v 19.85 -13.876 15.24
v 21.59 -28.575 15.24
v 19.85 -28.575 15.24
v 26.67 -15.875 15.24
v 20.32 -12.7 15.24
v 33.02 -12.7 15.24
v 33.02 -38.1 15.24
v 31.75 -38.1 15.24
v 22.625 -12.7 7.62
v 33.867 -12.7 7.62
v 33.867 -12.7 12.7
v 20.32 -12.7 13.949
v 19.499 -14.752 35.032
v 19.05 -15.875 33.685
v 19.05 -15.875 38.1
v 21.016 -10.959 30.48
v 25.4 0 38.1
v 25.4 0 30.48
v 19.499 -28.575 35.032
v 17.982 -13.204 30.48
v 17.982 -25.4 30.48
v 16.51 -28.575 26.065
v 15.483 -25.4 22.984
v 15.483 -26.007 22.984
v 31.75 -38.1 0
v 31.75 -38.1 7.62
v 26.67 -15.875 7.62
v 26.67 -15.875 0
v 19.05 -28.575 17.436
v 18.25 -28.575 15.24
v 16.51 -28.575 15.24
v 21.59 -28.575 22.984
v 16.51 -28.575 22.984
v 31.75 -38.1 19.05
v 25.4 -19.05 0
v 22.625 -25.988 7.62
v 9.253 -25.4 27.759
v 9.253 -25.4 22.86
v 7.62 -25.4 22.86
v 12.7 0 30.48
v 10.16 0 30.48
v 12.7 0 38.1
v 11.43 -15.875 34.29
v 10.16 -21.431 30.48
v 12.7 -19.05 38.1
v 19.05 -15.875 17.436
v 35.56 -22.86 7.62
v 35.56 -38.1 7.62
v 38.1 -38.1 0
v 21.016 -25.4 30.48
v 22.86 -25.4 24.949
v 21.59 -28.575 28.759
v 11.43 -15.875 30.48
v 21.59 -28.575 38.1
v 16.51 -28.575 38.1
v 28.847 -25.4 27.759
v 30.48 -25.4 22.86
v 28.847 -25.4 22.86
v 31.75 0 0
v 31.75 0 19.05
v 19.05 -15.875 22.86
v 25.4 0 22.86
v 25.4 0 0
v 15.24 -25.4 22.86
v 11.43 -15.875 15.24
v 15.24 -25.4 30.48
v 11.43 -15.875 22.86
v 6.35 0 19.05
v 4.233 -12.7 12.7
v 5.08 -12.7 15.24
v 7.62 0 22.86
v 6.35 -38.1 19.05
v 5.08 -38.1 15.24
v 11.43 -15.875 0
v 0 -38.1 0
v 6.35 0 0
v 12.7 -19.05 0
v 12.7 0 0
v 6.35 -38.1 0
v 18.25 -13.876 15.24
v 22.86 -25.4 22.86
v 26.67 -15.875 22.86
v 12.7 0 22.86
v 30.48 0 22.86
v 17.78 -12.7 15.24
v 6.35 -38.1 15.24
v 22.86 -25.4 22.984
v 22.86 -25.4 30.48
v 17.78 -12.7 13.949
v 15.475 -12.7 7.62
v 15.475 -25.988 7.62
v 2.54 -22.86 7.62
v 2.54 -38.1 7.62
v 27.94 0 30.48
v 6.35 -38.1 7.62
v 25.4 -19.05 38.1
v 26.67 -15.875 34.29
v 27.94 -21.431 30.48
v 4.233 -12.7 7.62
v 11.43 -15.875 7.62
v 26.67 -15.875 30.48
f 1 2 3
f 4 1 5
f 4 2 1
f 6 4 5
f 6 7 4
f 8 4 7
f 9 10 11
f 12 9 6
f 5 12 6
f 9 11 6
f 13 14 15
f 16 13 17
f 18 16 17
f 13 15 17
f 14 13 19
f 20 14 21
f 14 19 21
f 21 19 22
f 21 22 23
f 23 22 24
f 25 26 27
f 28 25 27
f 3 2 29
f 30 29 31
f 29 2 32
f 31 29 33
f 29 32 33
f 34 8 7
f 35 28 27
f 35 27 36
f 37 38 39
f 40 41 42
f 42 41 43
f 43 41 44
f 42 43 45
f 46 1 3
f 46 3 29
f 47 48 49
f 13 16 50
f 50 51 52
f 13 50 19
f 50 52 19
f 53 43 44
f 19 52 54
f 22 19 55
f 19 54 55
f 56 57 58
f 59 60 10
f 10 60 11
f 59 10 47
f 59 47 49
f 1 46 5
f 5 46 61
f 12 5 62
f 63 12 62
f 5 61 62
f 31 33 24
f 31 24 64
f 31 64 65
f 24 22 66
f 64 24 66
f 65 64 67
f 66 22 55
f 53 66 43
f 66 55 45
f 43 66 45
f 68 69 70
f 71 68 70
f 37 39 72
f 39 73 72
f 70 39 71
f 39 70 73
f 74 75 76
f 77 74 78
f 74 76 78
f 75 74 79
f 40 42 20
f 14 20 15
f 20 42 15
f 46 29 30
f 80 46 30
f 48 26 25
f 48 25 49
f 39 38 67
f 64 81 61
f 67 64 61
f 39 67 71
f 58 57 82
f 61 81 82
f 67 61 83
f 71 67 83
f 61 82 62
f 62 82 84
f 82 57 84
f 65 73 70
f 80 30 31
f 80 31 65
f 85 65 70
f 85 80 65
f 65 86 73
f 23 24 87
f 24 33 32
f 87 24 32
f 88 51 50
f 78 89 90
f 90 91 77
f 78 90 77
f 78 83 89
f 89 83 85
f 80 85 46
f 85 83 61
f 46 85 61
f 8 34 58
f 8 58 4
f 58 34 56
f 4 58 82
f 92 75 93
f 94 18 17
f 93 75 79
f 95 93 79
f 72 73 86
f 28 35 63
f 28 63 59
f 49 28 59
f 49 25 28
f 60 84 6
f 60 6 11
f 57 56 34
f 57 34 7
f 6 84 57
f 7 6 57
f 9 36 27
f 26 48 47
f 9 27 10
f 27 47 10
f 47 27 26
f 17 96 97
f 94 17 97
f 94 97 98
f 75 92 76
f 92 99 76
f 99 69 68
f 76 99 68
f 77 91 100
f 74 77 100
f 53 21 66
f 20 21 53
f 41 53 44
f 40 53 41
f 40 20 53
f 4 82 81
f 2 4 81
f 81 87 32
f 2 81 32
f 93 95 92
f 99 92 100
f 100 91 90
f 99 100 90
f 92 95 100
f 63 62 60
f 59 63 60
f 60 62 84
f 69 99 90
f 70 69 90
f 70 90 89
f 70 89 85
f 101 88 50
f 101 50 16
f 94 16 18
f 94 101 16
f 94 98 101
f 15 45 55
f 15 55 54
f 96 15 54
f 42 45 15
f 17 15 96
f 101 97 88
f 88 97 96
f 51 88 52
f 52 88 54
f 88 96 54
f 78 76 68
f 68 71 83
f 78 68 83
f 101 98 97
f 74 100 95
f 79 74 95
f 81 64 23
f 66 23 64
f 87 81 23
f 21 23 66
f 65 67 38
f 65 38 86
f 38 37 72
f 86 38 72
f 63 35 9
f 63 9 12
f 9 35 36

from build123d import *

# Parameters (mm, degrees)
F0_W      = 38.1
F0_H      = 38.1
F1_DEPTH  = 38.1
F5_W      = 25.4
F5_H      = 7.62
F6_DEPTH  = 38.1
F8_DEPTH  = 38.1
F10_DEPTH = 38.1


with BuildPart() as f1:
    # F0 (on Front) → F1 (new body)
    with BuildSketch(Plane.XZ):
        with Locations((19.05, 19.05)):
            Rectangle(F0_W, F0_H)
    extrude(amount=F1_DEPTH)

    # F5 (on offset) → F6 (cut)
    with BuildSketch(Plane.YZ.offset(38.1)):
        with Locations((-12.7, 26.67)):
            Rectangle(F5_W, F5_H)
        with Locations((-25.4, 11.43)):
            Rectangle(F5_W, F5_H)
    extrude(amount=-F6_DEPTH, mode=Mode.SUBTRACT)

    # F7 (on offset) → F8 (cut)
    with BuildSketch(Plane.XZ.offset(38.1)):
        Polygon((0, 38.1), (0, 0), (12.7, 38.1), align=None)
        Polygon((19.05, 17.435988), (12.7, 0), (25.4, 0), align=None)
        Polygon((23.515154, 22.983656), (19.499061, 35.031934), (15.482969, 22.983656), align=None)
        Polygon((38.1, 38.1), (25.4, 38.1), (38.1, 0), align=None)
    extrude(amount=-F8_DEPTH, mode=Mode.SUBTRACT)

    # F9 (on offset) → F10 (cut)
    with BuildSketch(Plane.XY.offset(38.1)):
        Polygon((6.35, 0), (0, 0), (0, -38.1), align=None)
        Polygon((11.43, -15.875), (6.35, -38.1), (31.75, -38.1), (26.67, -15.875), (21.59, -28.575), (16.51, -28.575), align=None)
        Polygon((25.4, 0), (12.7, 0), (19.05, -15.875), align=None)
        Polygon((38.1, 0), (31.75, 0), (38.1, -38.1), align=None)
    extrude(amount=-F10_DEPTH, mode=Mode.SUBTRACT)


solid = f1.part
